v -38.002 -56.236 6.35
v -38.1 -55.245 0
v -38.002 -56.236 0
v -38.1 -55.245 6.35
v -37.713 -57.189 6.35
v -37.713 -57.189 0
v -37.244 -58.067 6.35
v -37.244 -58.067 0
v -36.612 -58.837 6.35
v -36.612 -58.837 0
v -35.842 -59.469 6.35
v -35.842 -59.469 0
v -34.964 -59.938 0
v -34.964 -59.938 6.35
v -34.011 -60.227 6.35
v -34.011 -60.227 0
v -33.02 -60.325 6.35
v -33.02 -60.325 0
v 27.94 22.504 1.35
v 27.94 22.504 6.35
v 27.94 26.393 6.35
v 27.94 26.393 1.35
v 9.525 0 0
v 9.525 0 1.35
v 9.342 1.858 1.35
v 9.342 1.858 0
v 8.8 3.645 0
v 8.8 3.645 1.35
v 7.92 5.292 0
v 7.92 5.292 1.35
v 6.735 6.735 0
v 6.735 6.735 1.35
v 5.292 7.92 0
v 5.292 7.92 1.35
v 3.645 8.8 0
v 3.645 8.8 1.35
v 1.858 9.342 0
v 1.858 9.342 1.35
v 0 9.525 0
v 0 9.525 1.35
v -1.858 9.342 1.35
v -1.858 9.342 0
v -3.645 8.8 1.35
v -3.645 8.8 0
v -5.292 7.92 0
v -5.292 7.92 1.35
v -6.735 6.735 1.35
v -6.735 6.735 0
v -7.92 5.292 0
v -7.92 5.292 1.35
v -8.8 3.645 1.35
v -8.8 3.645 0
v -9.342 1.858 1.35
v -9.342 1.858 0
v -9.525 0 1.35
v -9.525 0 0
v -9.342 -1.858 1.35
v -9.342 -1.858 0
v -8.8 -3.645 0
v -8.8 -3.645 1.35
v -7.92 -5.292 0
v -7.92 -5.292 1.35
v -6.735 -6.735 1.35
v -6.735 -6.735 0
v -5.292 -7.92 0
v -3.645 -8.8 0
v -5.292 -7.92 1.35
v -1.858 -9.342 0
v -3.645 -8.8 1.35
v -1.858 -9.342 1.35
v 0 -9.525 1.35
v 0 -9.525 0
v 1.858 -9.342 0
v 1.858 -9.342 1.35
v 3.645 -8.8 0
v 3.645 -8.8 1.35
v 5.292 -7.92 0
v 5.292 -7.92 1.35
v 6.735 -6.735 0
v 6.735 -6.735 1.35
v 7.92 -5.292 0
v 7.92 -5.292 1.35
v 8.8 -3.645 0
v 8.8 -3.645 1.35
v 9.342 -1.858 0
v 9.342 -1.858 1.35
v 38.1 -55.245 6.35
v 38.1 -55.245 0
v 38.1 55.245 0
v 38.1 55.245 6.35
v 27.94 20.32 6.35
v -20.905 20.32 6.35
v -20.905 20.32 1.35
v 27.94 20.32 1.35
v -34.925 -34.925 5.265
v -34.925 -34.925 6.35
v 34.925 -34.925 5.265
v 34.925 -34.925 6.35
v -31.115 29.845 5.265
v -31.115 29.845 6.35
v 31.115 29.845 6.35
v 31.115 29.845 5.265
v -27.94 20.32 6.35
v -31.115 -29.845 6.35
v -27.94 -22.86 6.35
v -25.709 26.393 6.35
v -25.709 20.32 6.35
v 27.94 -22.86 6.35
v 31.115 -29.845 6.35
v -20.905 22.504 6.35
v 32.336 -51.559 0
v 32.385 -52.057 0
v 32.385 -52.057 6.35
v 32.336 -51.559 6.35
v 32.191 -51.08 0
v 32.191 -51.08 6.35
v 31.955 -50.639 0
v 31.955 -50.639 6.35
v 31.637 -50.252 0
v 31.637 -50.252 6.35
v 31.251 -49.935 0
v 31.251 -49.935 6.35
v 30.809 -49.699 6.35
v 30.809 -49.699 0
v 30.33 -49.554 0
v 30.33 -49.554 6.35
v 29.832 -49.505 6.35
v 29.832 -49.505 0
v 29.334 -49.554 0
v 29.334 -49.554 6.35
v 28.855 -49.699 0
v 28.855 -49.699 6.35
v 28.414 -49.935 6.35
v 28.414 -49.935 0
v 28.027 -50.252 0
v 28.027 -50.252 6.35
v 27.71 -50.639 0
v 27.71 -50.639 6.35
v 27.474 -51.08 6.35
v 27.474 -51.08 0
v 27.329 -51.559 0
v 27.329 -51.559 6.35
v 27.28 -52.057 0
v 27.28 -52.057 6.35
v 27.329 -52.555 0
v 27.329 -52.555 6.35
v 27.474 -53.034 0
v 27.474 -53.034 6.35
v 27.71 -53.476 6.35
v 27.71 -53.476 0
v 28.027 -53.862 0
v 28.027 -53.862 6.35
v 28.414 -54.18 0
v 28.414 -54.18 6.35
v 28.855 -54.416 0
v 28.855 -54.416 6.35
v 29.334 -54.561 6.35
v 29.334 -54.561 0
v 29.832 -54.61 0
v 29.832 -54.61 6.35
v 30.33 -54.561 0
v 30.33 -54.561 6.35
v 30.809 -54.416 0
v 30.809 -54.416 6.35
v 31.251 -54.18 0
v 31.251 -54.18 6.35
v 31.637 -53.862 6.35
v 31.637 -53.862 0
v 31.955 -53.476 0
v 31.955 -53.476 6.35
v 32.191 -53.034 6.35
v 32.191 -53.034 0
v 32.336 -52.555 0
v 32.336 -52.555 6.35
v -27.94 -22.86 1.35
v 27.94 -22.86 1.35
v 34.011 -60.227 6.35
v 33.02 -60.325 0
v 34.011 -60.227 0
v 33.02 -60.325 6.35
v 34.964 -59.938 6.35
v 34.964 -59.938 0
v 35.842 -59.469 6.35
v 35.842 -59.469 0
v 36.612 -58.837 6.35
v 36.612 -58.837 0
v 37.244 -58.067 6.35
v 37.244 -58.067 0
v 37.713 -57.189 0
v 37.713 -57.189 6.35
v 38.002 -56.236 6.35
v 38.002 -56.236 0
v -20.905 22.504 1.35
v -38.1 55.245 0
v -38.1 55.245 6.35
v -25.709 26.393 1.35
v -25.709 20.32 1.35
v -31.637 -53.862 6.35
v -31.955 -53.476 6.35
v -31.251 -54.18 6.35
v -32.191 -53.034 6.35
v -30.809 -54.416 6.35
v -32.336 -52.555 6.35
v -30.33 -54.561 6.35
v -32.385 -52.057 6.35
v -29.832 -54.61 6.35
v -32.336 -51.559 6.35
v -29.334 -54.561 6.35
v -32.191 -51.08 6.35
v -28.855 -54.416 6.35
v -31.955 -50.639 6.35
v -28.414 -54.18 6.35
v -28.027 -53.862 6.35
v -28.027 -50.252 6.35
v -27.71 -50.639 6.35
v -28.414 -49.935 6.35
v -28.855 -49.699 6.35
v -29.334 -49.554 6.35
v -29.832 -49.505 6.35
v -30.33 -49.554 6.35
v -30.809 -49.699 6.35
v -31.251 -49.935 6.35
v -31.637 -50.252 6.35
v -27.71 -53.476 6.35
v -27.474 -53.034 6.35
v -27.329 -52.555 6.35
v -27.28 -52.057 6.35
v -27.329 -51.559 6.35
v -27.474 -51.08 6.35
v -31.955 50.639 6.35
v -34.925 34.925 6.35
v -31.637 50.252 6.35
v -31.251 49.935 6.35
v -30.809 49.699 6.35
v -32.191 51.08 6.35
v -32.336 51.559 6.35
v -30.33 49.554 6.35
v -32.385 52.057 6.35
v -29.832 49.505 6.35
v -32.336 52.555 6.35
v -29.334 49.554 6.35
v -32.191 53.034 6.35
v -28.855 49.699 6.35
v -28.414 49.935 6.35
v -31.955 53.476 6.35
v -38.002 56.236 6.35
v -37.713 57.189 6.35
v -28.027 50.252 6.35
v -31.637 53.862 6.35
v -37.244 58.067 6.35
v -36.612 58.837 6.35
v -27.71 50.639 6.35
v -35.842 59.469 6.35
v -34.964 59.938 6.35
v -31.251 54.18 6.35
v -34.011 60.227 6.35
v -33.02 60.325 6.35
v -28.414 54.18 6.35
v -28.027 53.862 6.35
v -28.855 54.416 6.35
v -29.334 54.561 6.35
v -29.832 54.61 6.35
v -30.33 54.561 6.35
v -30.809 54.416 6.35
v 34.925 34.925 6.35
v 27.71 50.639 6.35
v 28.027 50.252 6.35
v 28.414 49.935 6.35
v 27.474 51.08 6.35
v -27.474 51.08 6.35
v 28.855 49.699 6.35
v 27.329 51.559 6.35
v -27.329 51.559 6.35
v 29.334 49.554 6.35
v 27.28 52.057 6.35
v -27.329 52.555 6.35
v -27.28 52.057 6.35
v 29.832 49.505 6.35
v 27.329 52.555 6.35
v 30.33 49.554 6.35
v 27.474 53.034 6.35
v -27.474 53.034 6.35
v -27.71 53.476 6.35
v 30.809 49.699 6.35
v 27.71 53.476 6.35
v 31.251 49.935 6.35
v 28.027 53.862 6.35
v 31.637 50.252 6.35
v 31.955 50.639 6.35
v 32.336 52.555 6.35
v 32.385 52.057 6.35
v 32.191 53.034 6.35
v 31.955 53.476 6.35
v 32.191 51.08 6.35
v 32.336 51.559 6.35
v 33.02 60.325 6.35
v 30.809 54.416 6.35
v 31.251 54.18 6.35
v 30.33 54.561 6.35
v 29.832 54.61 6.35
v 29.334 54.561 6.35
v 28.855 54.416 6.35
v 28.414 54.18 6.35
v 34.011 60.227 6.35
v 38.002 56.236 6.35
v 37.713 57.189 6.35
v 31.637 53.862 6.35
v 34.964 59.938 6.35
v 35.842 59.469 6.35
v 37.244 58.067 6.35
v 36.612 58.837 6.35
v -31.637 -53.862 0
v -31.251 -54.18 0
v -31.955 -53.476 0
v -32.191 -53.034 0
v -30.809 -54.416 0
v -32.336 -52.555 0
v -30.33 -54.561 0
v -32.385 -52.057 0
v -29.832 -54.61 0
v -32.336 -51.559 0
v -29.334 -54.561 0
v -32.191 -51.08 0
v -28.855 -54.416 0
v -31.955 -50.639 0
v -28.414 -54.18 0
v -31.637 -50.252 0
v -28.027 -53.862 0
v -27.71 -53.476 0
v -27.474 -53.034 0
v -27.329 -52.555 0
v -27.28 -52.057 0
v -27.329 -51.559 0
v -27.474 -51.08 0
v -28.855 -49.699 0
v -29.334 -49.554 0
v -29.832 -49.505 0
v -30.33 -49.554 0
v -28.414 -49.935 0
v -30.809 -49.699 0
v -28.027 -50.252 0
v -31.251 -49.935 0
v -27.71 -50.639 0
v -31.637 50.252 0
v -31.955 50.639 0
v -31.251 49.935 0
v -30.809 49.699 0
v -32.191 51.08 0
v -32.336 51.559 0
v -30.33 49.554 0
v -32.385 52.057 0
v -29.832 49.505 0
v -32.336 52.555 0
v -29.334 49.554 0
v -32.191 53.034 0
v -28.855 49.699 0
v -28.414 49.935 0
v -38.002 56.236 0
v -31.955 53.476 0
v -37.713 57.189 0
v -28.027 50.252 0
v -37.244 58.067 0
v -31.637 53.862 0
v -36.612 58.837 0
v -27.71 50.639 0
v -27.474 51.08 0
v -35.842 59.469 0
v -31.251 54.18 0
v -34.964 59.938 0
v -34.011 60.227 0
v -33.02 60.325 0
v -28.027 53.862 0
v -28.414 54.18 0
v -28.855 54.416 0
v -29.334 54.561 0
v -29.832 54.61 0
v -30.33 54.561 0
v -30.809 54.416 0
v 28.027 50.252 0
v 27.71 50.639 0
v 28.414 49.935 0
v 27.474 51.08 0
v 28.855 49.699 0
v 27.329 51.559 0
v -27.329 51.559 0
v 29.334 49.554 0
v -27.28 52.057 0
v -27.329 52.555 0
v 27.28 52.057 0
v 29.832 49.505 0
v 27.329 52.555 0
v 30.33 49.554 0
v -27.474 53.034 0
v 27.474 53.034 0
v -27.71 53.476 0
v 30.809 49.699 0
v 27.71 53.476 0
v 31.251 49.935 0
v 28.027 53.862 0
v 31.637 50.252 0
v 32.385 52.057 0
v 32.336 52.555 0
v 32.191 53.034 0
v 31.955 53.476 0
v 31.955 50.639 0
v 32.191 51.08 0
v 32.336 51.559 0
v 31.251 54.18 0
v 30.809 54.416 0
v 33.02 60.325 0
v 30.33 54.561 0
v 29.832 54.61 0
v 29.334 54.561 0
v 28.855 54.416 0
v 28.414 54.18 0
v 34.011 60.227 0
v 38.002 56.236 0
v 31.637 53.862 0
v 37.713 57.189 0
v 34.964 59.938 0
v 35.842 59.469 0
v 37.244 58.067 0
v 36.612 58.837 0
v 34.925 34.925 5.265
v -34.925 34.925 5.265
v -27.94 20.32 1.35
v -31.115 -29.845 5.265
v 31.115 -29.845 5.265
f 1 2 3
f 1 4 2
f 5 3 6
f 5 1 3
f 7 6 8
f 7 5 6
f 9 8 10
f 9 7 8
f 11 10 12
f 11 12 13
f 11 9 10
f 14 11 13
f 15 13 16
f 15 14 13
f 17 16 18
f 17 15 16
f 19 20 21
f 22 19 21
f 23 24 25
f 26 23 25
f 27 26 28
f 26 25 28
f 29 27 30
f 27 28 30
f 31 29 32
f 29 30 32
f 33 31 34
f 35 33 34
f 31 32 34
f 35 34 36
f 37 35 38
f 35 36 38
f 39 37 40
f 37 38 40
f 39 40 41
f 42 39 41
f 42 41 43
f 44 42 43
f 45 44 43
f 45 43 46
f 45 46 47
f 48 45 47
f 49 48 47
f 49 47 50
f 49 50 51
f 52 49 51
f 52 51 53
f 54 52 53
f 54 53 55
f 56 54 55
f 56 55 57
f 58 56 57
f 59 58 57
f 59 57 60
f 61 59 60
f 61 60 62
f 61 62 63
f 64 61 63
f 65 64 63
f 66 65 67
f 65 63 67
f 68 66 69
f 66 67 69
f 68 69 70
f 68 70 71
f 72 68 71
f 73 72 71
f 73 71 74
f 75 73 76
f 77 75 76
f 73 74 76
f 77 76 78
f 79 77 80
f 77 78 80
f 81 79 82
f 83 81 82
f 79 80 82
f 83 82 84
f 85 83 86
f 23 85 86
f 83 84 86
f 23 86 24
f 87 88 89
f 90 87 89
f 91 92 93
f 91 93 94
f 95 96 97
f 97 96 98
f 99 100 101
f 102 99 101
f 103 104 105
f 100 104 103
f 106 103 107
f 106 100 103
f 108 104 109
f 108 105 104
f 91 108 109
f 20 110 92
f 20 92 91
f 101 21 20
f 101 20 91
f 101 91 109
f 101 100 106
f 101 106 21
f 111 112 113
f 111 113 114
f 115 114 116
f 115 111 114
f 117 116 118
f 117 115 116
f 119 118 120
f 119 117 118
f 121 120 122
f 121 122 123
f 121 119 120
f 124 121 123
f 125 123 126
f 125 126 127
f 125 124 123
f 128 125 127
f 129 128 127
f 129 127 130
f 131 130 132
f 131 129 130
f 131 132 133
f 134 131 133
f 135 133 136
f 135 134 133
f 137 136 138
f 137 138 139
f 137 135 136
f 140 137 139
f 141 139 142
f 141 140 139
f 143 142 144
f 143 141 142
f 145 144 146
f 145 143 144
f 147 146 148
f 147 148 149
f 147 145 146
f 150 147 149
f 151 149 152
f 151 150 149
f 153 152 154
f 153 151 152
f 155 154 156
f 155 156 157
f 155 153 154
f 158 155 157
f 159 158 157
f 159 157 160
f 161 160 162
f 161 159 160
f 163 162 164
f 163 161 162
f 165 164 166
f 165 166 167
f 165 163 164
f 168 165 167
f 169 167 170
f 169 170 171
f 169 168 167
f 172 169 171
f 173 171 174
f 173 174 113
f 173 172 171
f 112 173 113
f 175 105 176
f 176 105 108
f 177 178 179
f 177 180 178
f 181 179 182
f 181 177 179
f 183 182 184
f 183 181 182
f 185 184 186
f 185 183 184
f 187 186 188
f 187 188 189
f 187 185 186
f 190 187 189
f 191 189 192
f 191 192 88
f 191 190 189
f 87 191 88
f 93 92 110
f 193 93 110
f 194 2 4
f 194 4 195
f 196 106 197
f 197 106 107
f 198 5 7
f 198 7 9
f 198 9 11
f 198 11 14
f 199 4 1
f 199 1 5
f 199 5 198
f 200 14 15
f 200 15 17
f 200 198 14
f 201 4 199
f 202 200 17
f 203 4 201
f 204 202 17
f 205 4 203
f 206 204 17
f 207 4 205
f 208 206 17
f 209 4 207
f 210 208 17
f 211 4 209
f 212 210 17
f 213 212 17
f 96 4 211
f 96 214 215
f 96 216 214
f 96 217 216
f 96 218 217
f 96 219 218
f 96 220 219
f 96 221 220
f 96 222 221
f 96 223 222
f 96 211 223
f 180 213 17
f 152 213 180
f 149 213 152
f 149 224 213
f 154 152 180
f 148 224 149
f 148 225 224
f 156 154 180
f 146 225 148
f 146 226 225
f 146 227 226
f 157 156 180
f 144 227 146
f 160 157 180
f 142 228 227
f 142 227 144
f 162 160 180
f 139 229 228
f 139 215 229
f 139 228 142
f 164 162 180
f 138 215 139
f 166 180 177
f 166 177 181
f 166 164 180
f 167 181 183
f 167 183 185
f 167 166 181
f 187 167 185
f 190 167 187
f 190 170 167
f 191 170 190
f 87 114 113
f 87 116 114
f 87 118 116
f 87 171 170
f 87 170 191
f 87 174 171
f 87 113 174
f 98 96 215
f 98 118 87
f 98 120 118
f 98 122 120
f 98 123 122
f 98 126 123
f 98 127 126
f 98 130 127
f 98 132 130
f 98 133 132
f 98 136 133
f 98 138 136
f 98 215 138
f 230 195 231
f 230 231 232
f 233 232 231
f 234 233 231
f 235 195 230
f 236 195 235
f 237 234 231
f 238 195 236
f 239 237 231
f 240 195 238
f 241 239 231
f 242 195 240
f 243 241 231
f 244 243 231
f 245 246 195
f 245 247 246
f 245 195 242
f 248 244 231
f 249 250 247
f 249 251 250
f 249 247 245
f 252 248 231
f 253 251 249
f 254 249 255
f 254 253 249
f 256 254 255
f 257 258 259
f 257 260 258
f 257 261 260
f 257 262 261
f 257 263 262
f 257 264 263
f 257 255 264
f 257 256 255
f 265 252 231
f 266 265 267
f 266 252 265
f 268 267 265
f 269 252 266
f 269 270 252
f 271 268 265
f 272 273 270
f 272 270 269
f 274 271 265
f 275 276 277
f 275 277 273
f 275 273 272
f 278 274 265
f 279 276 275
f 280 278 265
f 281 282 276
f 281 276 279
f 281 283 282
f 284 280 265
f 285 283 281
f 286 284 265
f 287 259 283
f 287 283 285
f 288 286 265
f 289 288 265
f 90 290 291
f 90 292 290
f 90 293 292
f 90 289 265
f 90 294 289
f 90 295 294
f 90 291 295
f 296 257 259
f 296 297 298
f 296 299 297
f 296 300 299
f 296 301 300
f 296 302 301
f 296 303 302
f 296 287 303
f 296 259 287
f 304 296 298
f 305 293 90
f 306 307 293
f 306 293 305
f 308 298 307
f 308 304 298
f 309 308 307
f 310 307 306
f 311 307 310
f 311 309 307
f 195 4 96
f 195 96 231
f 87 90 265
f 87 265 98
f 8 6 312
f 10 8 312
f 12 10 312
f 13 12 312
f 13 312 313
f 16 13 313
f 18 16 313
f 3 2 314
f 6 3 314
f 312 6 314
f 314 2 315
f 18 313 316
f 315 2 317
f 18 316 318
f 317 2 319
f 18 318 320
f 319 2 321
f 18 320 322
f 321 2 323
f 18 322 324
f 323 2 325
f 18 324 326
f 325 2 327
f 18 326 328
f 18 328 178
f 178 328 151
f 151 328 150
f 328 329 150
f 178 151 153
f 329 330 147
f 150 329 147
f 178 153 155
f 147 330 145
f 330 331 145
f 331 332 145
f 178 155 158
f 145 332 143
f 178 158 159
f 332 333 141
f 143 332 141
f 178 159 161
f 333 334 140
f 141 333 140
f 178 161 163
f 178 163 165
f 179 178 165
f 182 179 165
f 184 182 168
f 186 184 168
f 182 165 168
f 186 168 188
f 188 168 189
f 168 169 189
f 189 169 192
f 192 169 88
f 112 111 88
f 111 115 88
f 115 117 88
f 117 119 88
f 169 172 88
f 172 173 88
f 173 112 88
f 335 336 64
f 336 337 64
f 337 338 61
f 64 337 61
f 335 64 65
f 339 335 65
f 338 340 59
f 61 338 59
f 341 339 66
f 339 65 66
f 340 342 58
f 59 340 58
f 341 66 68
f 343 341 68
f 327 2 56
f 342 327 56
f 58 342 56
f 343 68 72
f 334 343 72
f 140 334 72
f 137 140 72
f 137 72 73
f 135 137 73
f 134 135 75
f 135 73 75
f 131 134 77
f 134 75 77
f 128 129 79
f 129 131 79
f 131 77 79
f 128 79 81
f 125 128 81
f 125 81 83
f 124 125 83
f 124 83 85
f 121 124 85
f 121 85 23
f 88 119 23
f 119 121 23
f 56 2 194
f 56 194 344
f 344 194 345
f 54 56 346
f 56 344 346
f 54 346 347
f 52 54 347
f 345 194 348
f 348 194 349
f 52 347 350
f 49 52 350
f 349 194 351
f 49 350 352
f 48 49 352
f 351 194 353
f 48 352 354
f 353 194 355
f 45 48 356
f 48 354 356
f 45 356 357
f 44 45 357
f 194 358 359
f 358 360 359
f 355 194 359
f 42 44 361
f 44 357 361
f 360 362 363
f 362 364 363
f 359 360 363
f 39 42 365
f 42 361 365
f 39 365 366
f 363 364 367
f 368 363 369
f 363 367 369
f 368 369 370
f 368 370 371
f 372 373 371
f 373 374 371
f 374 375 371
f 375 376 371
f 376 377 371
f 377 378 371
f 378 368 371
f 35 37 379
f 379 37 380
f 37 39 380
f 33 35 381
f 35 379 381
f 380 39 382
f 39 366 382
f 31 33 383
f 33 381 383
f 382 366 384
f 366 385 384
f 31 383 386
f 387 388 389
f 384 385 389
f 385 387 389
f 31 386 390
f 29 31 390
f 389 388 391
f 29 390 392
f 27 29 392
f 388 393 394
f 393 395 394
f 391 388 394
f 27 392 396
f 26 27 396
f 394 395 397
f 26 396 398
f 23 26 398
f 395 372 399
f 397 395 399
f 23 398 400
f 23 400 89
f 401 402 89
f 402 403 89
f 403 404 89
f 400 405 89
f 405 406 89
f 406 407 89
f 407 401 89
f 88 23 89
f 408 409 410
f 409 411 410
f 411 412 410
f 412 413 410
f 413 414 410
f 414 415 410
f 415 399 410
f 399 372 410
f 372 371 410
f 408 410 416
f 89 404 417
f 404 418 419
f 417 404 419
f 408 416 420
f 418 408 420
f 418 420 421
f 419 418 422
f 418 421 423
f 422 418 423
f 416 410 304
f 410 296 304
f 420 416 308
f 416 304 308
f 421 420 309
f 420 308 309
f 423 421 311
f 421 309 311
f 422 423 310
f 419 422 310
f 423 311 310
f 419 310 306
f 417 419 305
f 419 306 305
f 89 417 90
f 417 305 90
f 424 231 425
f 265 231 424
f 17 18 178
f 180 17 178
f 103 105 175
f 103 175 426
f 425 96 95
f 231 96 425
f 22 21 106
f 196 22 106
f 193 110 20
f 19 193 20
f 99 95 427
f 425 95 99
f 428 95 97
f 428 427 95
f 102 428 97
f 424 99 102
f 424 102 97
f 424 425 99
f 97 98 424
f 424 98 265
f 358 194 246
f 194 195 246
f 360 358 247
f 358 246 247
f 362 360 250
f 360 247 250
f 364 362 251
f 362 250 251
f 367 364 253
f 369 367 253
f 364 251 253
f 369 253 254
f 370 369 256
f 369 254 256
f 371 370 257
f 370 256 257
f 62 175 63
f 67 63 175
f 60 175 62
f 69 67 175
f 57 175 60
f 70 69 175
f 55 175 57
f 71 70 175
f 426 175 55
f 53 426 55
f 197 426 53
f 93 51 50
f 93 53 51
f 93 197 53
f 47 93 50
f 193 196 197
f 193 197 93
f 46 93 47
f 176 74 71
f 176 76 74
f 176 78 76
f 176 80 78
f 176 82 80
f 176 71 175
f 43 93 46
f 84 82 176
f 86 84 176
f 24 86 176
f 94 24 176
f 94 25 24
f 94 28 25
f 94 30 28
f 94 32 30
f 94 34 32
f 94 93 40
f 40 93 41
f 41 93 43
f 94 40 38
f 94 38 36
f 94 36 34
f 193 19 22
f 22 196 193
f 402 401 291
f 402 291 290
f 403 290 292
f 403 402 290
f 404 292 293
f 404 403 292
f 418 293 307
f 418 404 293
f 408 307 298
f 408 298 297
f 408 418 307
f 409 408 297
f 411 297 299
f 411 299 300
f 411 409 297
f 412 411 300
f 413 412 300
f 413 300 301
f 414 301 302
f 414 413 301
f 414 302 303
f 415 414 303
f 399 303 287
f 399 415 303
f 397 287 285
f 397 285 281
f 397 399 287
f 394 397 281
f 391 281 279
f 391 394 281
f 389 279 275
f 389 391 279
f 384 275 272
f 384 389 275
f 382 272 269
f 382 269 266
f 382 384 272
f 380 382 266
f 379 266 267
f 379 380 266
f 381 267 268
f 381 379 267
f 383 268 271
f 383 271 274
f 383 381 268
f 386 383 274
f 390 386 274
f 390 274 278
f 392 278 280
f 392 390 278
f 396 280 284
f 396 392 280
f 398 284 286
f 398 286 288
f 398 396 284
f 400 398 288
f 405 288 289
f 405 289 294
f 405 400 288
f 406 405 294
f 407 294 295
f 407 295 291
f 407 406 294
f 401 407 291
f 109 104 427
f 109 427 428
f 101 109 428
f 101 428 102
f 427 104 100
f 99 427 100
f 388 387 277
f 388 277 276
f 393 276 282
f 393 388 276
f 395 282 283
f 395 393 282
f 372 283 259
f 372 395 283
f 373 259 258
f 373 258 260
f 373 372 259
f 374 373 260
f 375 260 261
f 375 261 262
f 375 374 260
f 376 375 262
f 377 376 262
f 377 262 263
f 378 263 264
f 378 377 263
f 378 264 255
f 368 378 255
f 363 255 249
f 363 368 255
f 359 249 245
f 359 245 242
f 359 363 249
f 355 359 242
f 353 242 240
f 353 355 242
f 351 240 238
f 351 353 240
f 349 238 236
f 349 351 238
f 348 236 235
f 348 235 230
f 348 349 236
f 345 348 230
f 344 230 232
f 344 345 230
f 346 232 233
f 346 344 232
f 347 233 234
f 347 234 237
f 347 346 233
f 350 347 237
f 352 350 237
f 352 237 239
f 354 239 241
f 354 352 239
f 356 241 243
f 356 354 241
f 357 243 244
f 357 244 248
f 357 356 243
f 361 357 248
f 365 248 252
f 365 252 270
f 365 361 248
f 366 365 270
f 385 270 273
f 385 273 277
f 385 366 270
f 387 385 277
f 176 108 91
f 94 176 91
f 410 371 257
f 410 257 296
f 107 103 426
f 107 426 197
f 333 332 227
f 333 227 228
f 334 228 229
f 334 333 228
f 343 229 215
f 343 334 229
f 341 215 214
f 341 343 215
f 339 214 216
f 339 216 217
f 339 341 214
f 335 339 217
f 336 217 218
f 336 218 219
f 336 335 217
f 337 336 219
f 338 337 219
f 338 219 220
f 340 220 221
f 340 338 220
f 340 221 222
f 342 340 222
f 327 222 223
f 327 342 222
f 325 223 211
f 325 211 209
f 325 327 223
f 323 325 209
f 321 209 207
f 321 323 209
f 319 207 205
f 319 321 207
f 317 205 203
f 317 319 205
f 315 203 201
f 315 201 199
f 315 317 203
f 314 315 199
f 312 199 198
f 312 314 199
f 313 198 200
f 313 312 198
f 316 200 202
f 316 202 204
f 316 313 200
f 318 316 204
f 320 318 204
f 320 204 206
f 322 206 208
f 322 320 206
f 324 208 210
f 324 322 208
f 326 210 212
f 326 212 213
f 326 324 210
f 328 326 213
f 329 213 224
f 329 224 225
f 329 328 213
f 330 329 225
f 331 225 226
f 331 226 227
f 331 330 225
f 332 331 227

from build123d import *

# Parameters (mm, degrees)
F0_W     = 76.2
F0_H     = 120.65
F0_R     = 2.5527
F1_DEPTH = 6.35
F2_R     = 9.525
F3_DEPTH = 6.35
F2_W     = 55.88
F2_H     = 43.18
F4_DEPTH = 5
F5_R     = 5.08
F6_W     = 69.85
F6_H     = 69.85
F6_W_2   = 62.23
F6_H_2   = 59.69
F7_DEPTH = 1.08458
F9_DEPTH = 5


# Not quite as in the source:
# - a length typed as a fraction of an inch, garbled in the dataset ("3 / 203.2 mm" for 3/8 in), is restored


with BuildPart() as f1:
    # F0 (on Top) → F1 (new body)
    with BuildSketch(Plane.XY):
        Rectangle(F0_W, F0_H)
        with Locations((-29.8323, -52.0573)):
            Circle(F0_R, mode=Mode.SUBTRACT)
        with Locations((29.8323, -52.0573)):
            Circle(F0_R, mode=Mode.SUBTRACT)
        with Locations((-29.8323, 52.0573)):
            Circle(F0_R, mode=Mode.SUBTRACT)
        with Locations((29.8323, 52.0573)):
            Circle(F0_R, mode=Mode.SUBTRACT)
    extrude(amount=F1_DEPTH)

    # F2 (on face) → F3 (cut)
    with BuildSketch(Plane.XY.offset(6.35)):
        Circle(F2_R)
    extrude(amount=-F3_DEPTH, mode=Mode.SUBTRACT)

    # F2 (on face) → F4 (cut)
    with BuildSketch(Plane.XY.offset(6.35)):
        with Locations((0, -1.27)):
            Rectangle(F2_W, F2_H)
        Circle(F2_R, mode=Mode.SUBTRACT)
    extrude(amount=-F4_DEPTH, mode=Mode.SUBTRACT)

    # F5
    f5_edges = [f1.edges().sort_by_distance(p)[0] for p in [
        (38.1, -60.325, 3.175),
        (38.1, 60.325, 3.175),
        (-38.1, 60.325, 3.175),
        (-38.1, -60.325, 3.175),
    ]]
    fillet(f5_edges, radius=F5_R)

    # F6 (on face) → F7 (cut)
    with BuildSketch(Plane.XY.offset(6.35)):
        Rectangle(F6_W, F6_H)
        Rectangle(F6_W_2, F6_H_2, mode=Mode.SUBTRACT)
    extrude(amount=-F7_DEPTH, mode=Mode.SUBTRACT)

    # F8 (on face) → F9 (cut)
    with BuildSketch(Plane.XY.offset(6.35)):
        Polygon((-25.7090758532, 20.32), (-20.905200392, 20.32), (-20.905200392, 22.5038137287), (27.94, 22.5038137287), (27.94, 26.3926647604), (-25.7090758532, 26.3926647604), align=None)
    extrude(amount=-F9_DEPTH, mode=Mode.SUBTRACT)


solid = f1.part
